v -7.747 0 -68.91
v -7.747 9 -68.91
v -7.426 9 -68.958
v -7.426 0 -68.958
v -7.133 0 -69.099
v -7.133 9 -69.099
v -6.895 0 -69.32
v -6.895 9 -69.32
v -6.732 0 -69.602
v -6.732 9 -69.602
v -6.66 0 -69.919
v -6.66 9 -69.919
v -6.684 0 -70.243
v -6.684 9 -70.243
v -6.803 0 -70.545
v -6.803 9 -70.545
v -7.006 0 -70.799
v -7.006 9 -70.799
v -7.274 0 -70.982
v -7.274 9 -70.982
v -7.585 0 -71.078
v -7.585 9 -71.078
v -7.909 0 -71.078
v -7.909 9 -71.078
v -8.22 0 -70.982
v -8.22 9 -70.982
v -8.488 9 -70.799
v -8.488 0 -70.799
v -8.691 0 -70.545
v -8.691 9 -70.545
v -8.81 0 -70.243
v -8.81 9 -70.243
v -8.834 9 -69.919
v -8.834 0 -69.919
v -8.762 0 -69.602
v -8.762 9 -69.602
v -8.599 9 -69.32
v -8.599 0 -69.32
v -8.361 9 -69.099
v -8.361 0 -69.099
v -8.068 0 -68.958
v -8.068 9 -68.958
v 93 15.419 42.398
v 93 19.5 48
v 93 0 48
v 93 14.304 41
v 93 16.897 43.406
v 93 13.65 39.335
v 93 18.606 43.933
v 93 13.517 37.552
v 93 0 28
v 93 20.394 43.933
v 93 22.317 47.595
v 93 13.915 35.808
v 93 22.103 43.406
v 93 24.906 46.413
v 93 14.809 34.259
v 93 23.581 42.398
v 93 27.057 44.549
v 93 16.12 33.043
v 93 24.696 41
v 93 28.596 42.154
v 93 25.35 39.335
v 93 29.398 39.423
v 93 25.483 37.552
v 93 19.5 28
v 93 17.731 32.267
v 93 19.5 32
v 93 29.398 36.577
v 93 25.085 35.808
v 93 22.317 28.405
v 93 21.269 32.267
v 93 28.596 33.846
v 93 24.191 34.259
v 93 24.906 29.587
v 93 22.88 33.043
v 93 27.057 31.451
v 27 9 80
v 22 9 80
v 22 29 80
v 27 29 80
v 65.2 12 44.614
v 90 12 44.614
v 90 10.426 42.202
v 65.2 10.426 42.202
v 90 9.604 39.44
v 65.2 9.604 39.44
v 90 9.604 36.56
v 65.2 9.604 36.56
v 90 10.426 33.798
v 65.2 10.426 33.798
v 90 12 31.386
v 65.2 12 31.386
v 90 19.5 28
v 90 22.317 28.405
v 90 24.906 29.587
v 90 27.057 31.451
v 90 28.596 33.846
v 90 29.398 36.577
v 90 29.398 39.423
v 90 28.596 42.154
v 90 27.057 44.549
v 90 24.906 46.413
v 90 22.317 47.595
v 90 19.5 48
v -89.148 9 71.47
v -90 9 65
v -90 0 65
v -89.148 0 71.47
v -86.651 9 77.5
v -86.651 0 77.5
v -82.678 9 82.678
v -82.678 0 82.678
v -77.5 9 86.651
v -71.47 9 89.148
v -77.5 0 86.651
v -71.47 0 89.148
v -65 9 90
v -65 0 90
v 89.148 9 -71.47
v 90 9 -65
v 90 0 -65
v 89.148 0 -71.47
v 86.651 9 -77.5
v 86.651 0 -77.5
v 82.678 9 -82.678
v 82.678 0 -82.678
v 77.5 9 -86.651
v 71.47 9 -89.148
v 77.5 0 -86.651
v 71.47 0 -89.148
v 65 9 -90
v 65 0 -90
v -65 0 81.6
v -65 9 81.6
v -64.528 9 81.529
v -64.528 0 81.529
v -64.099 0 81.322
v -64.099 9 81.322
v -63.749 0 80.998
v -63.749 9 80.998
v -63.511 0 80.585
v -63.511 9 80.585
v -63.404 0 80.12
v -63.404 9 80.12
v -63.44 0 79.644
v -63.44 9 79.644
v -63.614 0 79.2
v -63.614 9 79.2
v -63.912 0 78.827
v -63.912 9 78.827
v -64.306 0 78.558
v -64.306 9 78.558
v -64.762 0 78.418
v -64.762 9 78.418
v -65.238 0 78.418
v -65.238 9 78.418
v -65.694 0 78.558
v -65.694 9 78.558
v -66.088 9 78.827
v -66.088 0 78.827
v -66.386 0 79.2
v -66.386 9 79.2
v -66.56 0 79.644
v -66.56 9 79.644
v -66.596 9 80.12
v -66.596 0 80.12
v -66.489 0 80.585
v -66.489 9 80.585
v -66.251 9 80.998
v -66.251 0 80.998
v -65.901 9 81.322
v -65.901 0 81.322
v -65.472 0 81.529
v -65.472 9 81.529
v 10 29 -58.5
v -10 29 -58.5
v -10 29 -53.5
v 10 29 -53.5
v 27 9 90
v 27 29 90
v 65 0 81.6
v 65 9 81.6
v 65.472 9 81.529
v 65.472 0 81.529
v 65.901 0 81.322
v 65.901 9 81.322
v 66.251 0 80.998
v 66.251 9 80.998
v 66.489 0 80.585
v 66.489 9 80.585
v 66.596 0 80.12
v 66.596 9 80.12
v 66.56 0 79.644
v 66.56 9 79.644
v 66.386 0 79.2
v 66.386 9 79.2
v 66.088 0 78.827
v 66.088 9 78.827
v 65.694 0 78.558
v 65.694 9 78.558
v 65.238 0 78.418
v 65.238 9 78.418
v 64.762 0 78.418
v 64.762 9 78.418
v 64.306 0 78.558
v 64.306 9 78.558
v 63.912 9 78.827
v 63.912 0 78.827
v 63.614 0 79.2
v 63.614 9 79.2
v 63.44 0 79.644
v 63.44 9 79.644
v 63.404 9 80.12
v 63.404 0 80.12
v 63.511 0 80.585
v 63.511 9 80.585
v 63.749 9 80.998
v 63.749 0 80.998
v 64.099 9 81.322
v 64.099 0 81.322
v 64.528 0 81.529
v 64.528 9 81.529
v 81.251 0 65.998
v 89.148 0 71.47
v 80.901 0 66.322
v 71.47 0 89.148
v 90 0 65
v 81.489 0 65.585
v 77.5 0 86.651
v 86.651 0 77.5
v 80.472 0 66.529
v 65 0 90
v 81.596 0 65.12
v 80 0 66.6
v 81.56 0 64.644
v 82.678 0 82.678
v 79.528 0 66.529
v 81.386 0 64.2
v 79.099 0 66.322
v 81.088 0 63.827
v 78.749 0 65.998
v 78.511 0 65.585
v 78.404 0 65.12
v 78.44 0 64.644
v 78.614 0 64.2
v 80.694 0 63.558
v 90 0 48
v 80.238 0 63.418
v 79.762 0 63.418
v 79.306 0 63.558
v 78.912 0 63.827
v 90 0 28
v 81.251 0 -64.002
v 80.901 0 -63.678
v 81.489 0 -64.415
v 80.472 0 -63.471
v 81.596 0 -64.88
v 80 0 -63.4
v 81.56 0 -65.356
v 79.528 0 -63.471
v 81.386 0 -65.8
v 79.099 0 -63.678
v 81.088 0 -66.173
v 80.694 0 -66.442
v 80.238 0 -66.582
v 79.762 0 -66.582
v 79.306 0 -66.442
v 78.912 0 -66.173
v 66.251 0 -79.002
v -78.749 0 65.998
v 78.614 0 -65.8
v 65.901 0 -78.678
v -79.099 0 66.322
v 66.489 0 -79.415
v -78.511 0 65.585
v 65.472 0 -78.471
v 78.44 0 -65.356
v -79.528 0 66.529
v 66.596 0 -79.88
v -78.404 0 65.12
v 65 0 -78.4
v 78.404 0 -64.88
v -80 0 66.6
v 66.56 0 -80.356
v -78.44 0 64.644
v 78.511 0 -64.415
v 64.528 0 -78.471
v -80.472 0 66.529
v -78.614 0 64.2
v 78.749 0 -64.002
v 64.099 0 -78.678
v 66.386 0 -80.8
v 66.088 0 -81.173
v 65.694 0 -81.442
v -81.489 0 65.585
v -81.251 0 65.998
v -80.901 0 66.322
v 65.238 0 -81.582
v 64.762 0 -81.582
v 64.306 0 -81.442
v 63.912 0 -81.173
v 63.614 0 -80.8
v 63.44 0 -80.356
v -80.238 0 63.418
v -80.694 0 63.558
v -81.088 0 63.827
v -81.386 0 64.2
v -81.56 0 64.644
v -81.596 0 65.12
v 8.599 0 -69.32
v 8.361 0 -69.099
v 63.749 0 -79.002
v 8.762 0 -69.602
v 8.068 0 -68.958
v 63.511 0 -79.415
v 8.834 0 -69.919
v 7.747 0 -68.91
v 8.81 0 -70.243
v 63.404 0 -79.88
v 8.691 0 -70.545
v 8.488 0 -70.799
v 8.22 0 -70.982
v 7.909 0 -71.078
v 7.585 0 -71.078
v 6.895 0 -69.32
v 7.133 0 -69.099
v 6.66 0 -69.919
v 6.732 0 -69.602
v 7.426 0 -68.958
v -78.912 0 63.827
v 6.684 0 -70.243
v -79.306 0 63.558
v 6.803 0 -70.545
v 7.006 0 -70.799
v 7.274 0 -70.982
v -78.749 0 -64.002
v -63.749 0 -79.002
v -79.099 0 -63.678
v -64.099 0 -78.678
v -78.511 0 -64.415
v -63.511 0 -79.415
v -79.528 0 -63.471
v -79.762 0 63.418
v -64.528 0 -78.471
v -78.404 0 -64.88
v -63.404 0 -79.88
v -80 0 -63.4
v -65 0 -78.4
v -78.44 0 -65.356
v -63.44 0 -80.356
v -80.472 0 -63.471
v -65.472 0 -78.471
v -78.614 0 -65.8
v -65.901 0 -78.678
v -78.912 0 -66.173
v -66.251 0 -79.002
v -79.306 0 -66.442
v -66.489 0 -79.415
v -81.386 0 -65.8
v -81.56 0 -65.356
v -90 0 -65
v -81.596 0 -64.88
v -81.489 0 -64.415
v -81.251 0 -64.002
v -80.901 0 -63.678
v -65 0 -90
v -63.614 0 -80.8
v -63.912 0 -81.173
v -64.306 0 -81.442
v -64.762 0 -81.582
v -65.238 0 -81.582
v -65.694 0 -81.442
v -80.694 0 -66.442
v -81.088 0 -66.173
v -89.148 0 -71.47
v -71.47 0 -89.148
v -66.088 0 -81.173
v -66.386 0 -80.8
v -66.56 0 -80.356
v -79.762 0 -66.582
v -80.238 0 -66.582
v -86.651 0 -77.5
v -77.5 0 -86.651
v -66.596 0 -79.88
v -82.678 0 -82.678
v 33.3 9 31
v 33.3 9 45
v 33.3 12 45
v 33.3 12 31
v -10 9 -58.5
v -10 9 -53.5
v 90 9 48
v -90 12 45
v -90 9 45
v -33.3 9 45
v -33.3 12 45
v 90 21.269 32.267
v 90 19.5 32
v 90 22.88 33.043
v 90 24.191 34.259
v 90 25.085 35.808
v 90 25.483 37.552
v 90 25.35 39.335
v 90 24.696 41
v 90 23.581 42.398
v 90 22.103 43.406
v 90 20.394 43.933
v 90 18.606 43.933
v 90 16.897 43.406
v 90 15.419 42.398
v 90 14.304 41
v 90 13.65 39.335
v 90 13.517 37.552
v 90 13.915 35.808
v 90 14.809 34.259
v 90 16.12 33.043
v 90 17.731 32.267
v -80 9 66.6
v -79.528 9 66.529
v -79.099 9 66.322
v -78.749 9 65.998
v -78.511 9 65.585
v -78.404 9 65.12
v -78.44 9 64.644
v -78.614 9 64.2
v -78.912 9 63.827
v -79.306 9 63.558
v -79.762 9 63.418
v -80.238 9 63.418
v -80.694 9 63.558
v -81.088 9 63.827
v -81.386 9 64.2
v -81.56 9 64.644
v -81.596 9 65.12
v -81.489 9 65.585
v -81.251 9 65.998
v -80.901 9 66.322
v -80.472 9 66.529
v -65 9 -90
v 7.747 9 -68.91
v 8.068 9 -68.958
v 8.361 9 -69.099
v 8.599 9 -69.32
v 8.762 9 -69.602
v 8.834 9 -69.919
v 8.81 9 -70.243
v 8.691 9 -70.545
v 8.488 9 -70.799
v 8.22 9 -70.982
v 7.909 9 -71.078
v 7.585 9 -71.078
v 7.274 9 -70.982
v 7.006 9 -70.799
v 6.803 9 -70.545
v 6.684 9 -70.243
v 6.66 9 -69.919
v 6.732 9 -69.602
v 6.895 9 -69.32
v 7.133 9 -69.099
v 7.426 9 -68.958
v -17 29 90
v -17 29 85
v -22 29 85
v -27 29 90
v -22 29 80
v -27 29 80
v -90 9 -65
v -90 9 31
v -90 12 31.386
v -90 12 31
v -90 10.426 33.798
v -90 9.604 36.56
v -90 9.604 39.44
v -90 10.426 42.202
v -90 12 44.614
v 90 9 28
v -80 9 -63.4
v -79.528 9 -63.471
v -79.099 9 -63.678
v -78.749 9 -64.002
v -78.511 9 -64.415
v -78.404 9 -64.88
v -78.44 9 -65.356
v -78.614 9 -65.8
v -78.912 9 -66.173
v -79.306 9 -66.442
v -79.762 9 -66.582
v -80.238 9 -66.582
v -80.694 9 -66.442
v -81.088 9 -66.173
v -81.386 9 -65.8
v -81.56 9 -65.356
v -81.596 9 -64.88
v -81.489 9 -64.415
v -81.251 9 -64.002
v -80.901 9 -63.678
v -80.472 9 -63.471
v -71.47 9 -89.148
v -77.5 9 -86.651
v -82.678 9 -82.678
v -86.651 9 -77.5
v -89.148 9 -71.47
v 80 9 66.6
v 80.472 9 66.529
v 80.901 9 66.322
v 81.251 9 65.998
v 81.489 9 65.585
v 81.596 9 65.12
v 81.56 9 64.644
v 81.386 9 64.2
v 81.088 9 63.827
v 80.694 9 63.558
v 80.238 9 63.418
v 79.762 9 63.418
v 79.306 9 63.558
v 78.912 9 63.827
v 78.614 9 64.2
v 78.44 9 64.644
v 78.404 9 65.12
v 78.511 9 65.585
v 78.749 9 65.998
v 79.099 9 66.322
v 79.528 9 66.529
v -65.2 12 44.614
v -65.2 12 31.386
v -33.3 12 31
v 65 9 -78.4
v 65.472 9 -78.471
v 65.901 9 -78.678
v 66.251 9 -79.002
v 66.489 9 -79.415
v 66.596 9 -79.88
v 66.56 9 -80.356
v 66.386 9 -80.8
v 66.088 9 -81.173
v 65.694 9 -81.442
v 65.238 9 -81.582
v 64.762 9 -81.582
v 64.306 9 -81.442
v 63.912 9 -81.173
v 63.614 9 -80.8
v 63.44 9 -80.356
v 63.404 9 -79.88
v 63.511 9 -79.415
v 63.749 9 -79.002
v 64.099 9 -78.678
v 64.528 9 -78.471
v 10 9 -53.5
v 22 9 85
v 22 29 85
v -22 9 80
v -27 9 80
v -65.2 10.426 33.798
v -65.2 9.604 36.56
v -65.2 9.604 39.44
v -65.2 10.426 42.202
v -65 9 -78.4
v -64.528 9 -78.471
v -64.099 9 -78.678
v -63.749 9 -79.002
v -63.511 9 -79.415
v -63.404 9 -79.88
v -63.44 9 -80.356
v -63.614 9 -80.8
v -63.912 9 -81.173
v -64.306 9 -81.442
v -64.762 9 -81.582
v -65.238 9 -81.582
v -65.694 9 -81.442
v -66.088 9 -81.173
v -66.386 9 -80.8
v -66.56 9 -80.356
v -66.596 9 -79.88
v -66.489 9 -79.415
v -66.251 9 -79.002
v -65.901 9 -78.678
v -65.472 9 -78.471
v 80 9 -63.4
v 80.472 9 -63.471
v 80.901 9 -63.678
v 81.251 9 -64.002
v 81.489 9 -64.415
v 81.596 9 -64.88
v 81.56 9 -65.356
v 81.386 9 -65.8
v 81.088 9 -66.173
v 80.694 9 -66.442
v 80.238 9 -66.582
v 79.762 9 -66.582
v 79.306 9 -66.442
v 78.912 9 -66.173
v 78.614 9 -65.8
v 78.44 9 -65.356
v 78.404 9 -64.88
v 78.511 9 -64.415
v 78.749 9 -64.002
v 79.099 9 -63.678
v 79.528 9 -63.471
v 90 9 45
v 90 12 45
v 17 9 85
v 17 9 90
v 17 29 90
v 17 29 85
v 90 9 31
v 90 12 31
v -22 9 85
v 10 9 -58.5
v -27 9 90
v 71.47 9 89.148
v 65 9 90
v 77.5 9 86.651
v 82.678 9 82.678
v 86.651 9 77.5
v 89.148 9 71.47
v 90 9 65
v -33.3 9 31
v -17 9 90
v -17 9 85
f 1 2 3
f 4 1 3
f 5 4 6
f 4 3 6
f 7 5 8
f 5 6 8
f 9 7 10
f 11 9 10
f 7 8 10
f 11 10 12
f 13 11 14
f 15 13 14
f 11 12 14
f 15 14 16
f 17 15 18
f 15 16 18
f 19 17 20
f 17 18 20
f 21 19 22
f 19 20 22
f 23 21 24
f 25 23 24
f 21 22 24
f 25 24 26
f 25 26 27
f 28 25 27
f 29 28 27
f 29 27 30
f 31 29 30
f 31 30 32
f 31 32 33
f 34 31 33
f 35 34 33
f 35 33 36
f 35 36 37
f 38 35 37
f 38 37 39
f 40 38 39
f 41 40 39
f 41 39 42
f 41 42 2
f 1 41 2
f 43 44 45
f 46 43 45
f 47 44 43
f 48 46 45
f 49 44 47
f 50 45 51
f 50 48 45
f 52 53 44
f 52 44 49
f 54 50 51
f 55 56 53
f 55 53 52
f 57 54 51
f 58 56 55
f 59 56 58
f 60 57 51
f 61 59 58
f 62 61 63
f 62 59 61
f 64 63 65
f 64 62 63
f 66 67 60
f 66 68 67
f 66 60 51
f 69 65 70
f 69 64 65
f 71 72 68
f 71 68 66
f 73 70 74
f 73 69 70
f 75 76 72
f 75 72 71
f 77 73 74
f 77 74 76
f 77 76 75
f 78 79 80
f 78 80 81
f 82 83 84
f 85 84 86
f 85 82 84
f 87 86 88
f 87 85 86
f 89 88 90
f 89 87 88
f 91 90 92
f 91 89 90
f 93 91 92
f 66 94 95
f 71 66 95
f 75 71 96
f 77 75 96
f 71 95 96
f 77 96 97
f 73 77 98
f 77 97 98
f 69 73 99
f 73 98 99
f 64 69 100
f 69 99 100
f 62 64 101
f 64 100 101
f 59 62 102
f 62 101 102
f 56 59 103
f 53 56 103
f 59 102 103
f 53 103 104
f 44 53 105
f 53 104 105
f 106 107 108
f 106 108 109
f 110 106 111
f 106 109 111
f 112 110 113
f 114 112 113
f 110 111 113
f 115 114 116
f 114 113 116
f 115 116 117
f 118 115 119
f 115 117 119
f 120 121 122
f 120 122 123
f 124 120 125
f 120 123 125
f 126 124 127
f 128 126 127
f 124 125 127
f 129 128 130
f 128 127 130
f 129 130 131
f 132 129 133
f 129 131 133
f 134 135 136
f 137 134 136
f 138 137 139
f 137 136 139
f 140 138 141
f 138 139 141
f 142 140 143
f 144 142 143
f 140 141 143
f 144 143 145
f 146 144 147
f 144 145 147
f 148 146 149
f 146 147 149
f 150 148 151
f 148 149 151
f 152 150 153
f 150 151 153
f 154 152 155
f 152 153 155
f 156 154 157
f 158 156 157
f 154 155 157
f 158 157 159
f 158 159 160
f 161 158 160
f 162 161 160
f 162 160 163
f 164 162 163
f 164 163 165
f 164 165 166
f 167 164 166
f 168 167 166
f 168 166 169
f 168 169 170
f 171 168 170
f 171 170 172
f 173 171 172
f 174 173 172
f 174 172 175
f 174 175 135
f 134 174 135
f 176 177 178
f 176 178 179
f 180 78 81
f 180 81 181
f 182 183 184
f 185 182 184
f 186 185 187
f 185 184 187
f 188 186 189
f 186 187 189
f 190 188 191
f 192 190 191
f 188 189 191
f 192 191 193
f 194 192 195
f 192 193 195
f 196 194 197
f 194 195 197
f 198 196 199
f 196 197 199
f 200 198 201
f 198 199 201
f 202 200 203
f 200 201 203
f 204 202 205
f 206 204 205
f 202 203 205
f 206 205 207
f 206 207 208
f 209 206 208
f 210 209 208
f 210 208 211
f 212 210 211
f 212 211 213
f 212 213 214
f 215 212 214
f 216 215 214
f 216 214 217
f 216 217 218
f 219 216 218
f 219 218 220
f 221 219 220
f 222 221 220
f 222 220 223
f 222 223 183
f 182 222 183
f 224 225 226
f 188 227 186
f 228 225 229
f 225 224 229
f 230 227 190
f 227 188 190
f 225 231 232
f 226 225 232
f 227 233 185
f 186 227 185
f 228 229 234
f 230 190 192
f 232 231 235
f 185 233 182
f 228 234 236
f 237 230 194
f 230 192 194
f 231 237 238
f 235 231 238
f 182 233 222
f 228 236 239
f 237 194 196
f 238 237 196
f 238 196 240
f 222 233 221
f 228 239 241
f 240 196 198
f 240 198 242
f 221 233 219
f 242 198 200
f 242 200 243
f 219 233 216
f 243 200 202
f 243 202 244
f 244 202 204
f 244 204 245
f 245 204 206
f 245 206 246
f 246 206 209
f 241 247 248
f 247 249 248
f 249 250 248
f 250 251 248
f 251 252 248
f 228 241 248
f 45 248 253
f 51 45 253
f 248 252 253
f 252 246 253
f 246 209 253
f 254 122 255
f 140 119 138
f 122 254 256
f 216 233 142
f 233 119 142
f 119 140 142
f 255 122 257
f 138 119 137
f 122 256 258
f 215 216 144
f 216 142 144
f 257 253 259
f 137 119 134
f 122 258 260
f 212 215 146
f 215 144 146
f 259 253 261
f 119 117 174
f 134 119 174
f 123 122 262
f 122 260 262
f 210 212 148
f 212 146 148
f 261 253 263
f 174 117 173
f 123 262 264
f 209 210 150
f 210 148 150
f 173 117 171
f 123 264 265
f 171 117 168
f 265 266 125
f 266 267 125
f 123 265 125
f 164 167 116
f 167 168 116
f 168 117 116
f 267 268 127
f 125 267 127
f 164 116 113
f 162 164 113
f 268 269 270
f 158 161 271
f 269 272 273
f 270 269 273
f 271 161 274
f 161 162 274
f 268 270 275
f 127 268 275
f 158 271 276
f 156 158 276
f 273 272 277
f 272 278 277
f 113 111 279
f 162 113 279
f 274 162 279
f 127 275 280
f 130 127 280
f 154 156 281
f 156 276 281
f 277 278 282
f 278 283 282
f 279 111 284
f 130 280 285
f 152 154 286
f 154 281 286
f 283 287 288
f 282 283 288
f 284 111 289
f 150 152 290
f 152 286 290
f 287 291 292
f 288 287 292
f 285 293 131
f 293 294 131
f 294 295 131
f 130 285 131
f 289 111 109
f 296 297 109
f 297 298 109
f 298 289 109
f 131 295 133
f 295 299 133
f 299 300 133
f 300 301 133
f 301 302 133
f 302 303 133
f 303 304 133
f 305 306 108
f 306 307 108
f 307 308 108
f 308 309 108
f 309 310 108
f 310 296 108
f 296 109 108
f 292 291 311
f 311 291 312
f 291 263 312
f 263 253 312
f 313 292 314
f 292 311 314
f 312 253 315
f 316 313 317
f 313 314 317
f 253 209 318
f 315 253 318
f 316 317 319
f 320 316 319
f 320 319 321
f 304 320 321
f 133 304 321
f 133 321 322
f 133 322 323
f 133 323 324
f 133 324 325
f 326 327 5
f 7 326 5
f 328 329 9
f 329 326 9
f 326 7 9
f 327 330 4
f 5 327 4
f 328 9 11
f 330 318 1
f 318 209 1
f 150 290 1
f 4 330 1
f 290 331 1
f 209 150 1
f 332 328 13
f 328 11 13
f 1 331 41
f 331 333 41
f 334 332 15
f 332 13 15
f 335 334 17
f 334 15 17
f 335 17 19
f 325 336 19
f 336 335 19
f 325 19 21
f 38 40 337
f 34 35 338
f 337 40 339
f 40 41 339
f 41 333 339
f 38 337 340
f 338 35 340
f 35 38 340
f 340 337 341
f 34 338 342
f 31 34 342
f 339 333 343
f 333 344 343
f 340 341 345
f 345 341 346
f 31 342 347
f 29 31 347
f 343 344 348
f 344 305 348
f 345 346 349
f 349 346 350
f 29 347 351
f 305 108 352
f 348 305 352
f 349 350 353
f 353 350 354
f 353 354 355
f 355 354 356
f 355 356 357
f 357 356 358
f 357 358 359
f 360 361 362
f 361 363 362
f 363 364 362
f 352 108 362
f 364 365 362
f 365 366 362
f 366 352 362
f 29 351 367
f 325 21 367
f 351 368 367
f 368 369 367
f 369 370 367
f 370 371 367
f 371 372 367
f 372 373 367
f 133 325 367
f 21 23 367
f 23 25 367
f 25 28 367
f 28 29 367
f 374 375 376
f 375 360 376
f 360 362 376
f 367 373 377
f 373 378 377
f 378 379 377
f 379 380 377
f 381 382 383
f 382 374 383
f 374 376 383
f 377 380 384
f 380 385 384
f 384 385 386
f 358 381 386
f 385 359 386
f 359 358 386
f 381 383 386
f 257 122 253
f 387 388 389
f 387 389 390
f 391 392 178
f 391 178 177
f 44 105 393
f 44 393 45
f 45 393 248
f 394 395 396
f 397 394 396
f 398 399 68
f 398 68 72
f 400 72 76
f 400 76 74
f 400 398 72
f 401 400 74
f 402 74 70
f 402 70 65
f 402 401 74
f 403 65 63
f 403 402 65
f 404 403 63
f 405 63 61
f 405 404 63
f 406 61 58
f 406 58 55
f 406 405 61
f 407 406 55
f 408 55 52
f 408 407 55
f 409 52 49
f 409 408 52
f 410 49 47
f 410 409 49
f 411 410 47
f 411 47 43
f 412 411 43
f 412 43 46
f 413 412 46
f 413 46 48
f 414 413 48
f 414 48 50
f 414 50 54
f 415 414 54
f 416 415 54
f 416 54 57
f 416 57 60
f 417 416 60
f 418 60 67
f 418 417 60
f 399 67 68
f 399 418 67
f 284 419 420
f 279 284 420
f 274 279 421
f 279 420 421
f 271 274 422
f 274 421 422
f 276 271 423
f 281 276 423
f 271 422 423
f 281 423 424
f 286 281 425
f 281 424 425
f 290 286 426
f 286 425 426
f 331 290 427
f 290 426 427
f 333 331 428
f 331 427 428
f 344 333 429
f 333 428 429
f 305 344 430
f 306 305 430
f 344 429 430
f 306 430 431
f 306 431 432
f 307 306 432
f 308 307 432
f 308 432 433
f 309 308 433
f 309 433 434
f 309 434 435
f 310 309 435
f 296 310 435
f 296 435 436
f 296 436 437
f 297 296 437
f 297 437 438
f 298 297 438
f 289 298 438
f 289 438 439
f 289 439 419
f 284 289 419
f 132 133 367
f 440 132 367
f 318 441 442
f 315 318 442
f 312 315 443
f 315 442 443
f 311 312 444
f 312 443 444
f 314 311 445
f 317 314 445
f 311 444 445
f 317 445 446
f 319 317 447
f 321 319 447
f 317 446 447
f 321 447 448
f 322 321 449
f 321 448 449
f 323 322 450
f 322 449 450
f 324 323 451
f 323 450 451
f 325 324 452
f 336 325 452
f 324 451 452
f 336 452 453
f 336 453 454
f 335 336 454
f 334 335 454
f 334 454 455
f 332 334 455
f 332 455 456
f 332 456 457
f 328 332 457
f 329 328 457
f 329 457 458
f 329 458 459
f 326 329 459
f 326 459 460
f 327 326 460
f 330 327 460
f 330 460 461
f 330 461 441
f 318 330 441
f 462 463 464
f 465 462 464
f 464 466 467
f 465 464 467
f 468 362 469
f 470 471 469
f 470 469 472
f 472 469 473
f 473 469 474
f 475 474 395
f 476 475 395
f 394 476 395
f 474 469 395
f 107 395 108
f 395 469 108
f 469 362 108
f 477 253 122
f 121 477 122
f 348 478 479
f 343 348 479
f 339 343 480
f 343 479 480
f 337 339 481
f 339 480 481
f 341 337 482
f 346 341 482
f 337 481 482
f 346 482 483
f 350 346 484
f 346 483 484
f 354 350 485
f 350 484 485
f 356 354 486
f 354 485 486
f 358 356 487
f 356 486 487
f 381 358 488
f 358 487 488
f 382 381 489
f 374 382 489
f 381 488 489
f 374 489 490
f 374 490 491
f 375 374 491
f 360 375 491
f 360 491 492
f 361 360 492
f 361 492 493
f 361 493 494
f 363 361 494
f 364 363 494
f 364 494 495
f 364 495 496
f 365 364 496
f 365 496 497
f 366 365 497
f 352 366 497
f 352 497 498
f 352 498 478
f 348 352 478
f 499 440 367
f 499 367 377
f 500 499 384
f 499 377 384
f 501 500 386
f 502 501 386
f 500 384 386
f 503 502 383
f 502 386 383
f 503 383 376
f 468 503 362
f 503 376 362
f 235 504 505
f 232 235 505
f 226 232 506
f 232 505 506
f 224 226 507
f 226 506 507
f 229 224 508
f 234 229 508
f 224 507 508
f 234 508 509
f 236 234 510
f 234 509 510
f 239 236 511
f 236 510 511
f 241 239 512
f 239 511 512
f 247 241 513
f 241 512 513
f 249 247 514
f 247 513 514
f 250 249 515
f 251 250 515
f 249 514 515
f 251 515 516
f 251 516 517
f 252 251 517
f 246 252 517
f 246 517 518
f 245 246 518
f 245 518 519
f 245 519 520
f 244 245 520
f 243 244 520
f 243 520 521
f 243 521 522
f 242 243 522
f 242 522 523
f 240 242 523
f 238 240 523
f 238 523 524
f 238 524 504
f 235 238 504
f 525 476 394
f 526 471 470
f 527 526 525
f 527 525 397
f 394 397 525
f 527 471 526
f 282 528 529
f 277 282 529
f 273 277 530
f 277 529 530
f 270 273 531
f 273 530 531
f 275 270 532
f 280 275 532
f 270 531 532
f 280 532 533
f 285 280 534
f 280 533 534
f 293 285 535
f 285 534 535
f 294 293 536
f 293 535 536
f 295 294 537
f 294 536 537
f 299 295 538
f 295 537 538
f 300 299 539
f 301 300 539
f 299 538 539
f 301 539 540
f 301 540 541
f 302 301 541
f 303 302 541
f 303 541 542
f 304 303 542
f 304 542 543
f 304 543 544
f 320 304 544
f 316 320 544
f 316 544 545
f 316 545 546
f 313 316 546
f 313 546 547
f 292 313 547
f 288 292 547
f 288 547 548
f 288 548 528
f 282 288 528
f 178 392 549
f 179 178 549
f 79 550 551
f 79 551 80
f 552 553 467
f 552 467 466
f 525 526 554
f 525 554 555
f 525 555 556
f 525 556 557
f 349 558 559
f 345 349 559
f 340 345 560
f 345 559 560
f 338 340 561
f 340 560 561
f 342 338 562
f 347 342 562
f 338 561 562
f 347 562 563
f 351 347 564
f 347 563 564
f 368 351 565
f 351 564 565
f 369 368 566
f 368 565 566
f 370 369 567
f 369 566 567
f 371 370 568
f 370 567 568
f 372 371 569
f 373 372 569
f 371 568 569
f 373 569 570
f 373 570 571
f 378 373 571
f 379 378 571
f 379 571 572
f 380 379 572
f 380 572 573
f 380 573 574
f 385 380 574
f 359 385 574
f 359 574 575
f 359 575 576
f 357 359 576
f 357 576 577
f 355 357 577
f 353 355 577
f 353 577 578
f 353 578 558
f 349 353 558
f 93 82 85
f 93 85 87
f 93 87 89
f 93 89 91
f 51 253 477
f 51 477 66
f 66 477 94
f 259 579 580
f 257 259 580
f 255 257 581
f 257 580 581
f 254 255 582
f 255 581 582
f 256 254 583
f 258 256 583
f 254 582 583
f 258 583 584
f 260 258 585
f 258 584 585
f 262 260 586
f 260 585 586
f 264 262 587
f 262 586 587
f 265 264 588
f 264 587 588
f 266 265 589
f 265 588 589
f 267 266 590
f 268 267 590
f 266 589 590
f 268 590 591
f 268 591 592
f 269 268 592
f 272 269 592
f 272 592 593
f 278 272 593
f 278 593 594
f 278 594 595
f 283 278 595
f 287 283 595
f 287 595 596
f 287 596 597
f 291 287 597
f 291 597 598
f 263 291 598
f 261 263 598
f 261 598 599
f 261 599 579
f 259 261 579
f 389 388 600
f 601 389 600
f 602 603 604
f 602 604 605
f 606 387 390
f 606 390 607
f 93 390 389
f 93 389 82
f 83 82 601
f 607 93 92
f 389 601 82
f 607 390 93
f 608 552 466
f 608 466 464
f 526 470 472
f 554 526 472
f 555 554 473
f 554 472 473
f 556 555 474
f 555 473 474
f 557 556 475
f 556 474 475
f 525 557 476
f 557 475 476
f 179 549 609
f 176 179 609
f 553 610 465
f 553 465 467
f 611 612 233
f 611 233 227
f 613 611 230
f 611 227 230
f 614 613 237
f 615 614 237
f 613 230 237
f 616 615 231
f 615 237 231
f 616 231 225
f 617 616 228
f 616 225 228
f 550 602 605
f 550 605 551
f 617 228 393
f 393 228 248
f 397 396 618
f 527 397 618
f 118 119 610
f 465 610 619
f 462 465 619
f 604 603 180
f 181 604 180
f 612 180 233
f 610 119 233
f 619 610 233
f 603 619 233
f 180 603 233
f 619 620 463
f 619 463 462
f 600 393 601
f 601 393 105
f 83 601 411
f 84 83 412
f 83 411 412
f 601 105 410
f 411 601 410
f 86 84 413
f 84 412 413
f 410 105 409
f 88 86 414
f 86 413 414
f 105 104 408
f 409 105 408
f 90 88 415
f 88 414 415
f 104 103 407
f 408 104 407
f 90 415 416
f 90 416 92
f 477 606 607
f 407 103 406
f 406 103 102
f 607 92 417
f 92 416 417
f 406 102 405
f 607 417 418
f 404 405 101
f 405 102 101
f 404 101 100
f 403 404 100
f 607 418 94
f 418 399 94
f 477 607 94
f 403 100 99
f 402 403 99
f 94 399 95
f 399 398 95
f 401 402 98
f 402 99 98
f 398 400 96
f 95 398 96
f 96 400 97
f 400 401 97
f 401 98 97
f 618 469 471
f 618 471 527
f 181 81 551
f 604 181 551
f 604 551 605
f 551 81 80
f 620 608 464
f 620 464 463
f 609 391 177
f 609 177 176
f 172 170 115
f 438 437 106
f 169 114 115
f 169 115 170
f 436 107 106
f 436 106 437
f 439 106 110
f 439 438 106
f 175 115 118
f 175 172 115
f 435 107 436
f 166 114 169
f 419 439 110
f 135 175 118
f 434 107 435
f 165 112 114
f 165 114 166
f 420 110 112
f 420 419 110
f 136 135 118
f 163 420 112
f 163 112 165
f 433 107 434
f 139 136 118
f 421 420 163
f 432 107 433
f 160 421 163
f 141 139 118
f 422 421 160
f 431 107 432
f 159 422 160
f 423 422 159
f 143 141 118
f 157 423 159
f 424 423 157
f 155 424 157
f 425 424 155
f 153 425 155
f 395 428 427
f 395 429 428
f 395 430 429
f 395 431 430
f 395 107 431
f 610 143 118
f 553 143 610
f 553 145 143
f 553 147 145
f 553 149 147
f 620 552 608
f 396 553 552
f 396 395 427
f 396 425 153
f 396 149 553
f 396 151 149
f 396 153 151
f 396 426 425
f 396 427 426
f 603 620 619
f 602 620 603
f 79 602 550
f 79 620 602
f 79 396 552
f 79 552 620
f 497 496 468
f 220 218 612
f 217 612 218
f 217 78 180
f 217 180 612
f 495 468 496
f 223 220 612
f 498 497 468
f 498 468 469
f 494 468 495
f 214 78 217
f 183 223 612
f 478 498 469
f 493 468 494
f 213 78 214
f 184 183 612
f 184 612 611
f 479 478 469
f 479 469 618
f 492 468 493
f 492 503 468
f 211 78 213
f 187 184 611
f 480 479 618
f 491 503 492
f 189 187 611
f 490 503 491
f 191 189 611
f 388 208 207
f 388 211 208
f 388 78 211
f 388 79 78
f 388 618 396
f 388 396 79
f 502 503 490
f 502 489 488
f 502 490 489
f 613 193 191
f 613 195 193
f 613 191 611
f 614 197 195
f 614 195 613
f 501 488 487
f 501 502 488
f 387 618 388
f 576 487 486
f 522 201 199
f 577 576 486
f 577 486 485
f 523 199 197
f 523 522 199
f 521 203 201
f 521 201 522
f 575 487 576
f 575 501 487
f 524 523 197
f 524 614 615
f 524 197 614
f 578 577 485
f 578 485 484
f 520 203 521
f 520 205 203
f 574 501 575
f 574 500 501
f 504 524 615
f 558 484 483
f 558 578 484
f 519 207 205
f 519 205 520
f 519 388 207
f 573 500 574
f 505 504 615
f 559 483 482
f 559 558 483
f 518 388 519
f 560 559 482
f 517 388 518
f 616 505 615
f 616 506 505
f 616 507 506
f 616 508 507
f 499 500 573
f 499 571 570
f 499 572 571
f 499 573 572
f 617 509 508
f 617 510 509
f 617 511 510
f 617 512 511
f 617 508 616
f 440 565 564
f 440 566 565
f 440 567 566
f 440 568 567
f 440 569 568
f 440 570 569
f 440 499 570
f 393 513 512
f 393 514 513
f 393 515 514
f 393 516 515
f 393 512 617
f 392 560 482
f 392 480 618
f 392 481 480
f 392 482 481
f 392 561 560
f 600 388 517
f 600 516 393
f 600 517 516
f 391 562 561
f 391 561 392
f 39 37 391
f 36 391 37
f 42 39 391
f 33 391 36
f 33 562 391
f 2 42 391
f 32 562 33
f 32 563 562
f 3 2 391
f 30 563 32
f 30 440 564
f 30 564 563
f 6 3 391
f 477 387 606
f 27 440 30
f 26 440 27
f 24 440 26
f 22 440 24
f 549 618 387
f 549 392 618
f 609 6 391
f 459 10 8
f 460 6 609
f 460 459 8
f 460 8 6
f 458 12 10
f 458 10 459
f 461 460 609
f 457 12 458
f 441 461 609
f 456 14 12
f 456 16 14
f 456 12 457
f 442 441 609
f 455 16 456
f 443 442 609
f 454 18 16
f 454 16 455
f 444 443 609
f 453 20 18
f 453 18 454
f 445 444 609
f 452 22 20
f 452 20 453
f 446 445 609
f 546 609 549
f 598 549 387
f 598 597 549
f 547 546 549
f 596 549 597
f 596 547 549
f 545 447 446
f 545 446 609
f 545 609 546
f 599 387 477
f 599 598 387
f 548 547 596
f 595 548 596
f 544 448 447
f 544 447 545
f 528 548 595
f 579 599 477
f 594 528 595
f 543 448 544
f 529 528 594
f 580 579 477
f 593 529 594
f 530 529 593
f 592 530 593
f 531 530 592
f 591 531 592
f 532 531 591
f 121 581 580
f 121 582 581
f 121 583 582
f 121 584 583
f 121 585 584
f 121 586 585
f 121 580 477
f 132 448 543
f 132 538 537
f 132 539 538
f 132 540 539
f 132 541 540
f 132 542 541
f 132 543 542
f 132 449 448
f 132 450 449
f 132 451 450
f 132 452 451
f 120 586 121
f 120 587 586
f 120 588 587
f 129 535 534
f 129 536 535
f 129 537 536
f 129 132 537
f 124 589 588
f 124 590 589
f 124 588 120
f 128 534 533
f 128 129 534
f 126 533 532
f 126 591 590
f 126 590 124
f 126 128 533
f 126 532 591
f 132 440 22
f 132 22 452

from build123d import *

# Parameters (mm, degrees)
PLATE_DEPTH         = 9
SKETCH2_R           = 1.09
CASTER_HOLES_DEPTH  = 128.597021909
SKETCH3_R           = 1.6
HEX_HOLES_DEPTH     = 128.597021909
SKETCH4_W           = 20
SKETCH4_H           = 5
BOSS_EXTRUDE1_DEPTH = 20
SKETCH5_W           = 56.7
SKETCH5_H           = 14
BOSS_EXTRUDE2_DEPTH = 3
SKETCH6_R           = 10
CUT_EXTRUDE1_DEPTH  = 24.8
CUT_EXTRUDE2_START  = -24.8
SKETCH7_R           = 10
CUT_EXTRUDE2_DEPTH  = 24.8
SKETCH8_R           = 6
BOSS_EXTRUDE4_DEPTH = 3


with BuildPart() as part:
    # Sketch1 → Plate (new body)
    with BuildSketch(Plane(origin=(0, 0, 0), x_dir=(1, 0, 0), z_dir=(0, 1, 0))):
        with BuildLine():
            Line((-65, -90), (65, -90))
            ThreePointArc((65, -90), (82.67766953, -82.67766953), (90, -65))
            Line((90, -65), (90, 65))
            ThreePointArc((90, 65), (82.67766953, 82.67766953), (65, 90))
            Line((65, 90), (-65, 90))
            ThreePointArc((-65, 90), (-82.67766953, 82.67766953), (-90, 65))
            Line((-90, 65), (-90, -65))
            ThreePointArc((-90, -65), (-82.67766953, -82.67766953), (-65, -90))
        make_face()
    extrude(amount=PLATE_DEPTH)

    # Sketch2 → Caster Holes (cut, through all)
    with BuildSketch(Plane(origin=(0, 9, 0), x_dir=(1, 0, 0), z_dir=(0, 1, 0))):
        with Locations(Location((-7.747, 70, 0), (0, 0, 270))):
            Circle(SKETCH2_R)
        with Locations(Location((7.747, 70, 0), (0, 0, 270))):
            Circle(SKETCH2_R)
    extrude(amount=-CASTER_HOLES_DEPTH, mode=Mode.SUBTRACT)

    # Sketch3 → Hex Holes (cut, through all)
    with BuildSketch(Plane(origin=(0, 9, 0), x_dir=(1, 0, 0), z_dir=(0, 1, 0))):
        with Locations(Location((-65, 80, 0), (0, 0, 270))):
            Circle(SKETCH3_R)
        with Locations(Location((-80, 65, 0), (0, 0, 270))):
            Circle(SKETCH3_R)
        with Locations(Location((80, 65, 0), (0, 0, 270))):
            Circle(SKETCH3_R)
        with Locations(Location((80, -65, 0), (0, 0, 270))):
            Circle(SKETCH3_R)
        with Locations(Location((65, 80, 0), (0, 0, 270))):
            Circle(SKETCH3_R)
        with Locations(Location((65, -80, 0), (0, 0, 270))):
            Circle(SKETCH3_R)
        with Locations(Location((-65, -80, 0), (0, 0, 270))):
            Circle(SKETCH3_R)
        with Locations(Location((-80, -65, 0), (0, 0, 270))):
            Circle(SKETCH3_R)
    extrude(amount=-HEX_HOLES_DEPTH, mode=Mode.SUBTRACT)

    # Sketch4 → Boss-Extrude1 (add)
    with BuildSketch(Plane(origin=(0, 9, 0), x_dir=(1, 0, 0), z_dir=(0, 1, 0))):
        Polygon((-27, -90), (-27, -80), (-22, -80), (-22, -85), (-17, -85), (-17, -90), align=None)
        Polygon((17, -90), (17, -85), (22, -85), (22, -80), (27, -80), (27, -90), align=None)
        with Locations((0, 56)):
            Rectangle(SKETCH4_W, SKETCH4_H)
    extrude(amount=BOSS_EXTRUDE1_DEPTH)

    # Sketch5 → Boss-Extrude2 (add)
    with BuildSketch(Plane(origin=(0, 9, 0), x_dir=(1, 0, 0), z_dir=(0, 1, 0))):
        with Locations((-61.65, -38)):
            Rectangle(SKETCH5_W, SKETCH5_H)
        with Locations((61.65, -38)):
            Rectangle(SKETCH5_W, SKETCH5_H)
    extrude(amount=BOSS_EXTRUDE2_DEPTH)

    # Sketch6 → Cut-Extrude1 (cut)
    with BuildSketch(Plane.ZY.offset(90)):
        with Locations((38, 19.5)):
            Circle(SKETCH6_R)
    extrude(amount=-CUT_EXTRUDE1_DEPTH, mode=Mode.SUBTRACT)

    # Sketch7 → Cut-Extrude2 (cut)
    with BuildSketch(Plane(origin=(90, 0, 0), x_dir=(0, 0, -1), z_dir=(1, 0, 0)).offset(CUT_EXTRUDE2_START)):
        with Locations((-38, 19.5)):
            Circle(SKETCH7_R)
    extrude(amount=CUT_EXTRUDE2_DEPTH, mode=Mode.SUBTRACT)

    # Sketch8 → Boss-Extrude4 (add)
    with BuildSketch(Plane(origin=(90, 0, 0), x_dir=(0, 0, -1), z_dir=(1, 0, 0))):
        with BuildLine():
            Line((-48, 19.5), (-48, 0))
            Line((-48, 0), (-28, 0))
            Line((-28, 0), (-28, 19.5))
            ThreePointArc((-28, 19.5), (-38, 29.5), (-48, 19.5))
        make_face()
        with Locations((-38, 19.5)):
            Circle(SKETCH8_R, mode=Mode.SUBTRACT)
    extrude(amount=BOSS_EXTRUDE4_DEPTH)


solid = part.part
